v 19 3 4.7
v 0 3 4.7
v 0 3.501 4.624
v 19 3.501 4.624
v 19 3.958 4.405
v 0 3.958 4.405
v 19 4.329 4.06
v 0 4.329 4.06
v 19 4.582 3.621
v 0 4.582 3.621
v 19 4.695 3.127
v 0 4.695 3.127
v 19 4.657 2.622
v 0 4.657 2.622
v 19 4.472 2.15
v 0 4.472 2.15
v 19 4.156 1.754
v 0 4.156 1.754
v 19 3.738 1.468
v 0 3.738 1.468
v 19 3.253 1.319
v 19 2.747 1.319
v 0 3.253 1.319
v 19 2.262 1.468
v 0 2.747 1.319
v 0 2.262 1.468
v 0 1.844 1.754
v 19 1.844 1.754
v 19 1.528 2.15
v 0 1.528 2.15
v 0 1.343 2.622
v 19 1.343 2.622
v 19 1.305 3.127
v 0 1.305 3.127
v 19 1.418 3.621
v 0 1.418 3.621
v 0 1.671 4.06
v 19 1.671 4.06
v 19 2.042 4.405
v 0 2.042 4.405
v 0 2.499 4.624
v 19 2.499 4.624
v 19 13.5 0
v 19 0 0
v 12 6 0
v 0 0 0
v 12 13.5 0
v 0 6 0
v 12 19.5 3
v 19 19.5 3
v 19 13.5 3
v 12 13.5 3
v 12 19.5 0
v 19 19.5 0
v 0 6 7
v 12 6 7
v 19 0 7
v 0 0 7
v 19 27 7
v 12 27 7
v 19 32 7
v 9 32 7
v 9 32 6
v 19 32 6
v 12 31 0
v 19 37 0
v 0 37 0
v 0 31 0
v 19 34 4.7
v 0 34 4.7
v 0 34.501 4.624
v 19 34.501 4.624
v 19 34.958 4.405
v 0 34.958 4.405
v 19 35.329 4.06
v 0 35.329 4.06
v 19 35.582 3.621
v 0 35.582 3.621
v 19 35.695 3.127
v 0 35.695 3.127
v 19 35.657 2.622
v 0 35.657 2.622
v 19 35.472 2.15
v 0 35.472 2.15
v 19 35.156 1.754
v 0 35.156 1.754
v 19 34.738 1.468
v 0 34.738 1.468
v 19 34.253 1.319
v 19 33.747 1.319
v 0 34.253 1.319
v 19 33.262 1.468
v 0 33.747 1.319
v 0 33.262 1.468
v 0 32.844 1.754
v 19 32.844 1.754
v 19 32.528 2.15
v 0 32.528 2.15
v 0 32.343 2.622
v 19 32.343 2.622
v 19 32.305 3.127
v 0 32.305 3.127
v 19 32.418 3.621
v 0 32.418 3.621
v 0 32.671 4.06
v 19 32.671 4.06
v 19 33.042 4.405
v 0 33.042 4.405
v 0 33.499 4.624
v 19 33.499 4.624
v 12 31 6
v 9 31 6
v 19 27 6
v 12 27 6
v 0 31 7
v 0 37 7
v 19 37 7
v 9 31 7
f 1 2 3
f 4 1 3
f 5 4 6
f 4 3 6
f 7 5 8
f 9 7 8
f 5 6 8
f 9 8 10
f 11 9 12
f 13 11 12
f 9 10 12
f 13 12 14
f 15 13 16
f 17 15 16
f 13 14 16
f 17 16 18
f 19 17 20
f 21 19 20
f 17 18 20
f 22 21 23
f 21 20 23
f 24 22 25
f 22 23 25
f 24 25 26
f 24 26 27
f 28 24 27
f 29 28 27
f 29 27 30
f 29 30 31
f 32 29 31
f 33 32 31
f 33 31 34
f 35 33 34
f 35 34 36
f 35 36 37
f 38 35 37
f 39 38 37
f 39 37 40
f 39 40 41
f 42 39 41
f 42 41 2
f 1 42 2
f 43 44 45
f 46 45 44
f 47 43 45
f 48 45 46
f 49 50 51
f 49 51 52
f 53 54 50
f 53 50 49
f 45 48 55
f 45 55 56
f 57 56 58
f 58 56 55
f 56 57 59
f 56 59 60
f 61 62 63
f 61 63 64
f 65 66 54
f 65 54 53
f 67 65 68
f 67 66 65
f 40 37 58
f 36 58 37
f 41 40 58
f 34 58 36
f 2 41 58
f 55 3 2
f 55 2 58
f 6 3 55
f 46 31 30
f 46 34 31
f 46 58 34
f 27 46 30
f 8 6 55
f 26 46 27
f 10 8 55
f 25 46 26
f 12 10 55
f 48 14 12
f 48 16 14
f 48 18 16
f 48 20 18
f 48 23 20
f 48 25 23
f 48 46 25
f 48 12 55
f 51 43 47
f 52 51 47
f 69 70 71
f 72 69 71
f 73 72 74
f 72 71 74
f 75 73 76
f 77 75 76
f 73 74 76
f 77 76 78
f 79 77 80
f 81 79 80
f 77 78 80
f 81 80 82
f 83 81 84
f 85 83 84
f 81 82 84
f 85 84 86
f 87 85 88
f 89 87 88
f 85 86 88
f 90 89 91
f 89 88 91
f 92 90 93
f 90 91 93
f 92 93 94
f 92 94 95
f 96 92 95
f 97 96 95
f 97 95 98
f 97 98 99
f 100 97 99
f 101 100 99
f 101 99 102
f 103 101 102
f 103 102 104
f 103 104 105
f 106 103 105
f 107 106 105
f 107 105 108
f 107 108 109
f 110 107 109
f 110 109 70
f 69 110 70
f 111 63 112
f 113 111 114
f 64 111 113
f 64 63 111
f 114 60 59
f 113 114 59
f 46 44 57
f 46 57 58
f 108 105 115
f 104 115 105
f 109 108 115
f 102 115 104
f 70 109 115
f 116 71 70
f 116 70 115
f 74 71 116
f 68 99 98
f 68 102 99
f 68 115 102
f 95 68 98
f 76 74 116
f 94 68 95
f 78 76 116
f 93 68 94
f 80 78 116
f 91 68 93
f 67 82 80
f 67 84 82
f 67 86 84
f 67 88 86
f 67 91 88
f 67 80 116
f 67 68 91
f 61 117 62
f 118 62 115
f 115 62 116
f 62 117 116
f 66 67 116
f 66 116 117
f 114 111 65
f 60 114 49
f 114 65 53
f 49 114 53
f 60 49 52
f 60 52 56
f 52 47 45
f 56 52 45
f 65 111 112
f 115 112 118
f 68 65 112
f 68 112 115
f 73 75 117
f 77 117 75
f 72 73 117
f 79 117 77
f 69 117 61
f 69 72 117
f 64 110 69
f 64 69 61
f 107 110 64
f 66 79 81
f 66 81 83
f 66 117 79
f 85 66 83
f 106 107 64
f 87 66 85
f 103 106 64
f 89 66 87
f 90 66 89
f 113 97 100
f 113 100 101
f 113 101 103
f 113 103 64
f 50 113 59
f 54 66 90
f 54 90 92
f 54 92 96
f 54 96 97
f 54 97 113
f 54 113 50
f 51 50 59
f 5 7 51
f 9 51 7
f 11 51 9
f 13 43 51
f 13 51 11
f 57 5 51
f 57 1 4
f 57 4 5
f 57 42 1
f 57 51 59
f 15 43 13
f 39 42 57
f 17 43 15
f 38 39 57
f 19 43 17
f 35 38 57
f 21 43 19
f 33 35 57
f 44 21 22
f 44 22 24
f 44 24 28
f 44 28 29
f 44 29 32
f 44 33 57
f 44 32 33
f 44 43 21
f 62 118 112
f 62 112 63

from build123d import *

# Parameters (mm, degrees)
EXTRUDE_1_DEPTH     = 7
SKETCH_2_W          = 7
SKETCH_2_H          = 6
CUT_EXTRUDE_1_DEPTH = 3
SKETCH_3_R          = 1.7
CUT_EXTRUDE_2_DEPTH = 43.178193418
SKETCH_4_W          = 10
SKETCH_4_H          = 5
CUT_EXTRUDE_3_DEPTH = 1


with BuildPart() as part:
    # 草图1 → 凸台-拉伸1 (new body)
    with BuildSketch(Plane.XY):
        Polygon((0, 0), (0, 6), (12, 6), (12, 11), (12, 26), (12, 31), (0, 31), (0, 37), (19, 37), (19, 0), align=None)
    extrude(amount=EXTRUDE_1_DEPTH)

    # 草图2 → 切除-拉伸1 (cut)
    with BuildSketch(Plane(origin=(0, 0, 0), x_dir=(-1, 0, 0), z_dir=(0, 0, -1))):
        with Locations((-15.5, 16.5)):
            Rectangle(SKETCH_2_W, SKETCH_2_H)
    extrude(amount=-CUT_EXTRUDE_1_DEPTH, mode=Mode.SUBTRACT)

    # 草图3 → 切除-拉伸2 (cut, through all)
    with BuildSketch(Plane.ZY):
        with Locations((3, 34)):
            Circle(SKETCH_3_R)
        with Locations((3, 3)):
            Circle(SKETCH_3_R)
    extrude(amount=-CUT_EXTRUDE_2_DEPTH, mode=Mode.SUBTRACT)

    # 草图4 → 切除-拉伸3 (cut)
    with BuildSketch(Plane.XY.offset(7)):
        with Locations((14, 29.5)):
            Rectangle(SKETCH_4_W, SKETCH_4_H)
    extrude(amount=-CUT_EXTRUDE_3_DEPTH, mode=Mode.SUBTRACT)


solid = part.part
